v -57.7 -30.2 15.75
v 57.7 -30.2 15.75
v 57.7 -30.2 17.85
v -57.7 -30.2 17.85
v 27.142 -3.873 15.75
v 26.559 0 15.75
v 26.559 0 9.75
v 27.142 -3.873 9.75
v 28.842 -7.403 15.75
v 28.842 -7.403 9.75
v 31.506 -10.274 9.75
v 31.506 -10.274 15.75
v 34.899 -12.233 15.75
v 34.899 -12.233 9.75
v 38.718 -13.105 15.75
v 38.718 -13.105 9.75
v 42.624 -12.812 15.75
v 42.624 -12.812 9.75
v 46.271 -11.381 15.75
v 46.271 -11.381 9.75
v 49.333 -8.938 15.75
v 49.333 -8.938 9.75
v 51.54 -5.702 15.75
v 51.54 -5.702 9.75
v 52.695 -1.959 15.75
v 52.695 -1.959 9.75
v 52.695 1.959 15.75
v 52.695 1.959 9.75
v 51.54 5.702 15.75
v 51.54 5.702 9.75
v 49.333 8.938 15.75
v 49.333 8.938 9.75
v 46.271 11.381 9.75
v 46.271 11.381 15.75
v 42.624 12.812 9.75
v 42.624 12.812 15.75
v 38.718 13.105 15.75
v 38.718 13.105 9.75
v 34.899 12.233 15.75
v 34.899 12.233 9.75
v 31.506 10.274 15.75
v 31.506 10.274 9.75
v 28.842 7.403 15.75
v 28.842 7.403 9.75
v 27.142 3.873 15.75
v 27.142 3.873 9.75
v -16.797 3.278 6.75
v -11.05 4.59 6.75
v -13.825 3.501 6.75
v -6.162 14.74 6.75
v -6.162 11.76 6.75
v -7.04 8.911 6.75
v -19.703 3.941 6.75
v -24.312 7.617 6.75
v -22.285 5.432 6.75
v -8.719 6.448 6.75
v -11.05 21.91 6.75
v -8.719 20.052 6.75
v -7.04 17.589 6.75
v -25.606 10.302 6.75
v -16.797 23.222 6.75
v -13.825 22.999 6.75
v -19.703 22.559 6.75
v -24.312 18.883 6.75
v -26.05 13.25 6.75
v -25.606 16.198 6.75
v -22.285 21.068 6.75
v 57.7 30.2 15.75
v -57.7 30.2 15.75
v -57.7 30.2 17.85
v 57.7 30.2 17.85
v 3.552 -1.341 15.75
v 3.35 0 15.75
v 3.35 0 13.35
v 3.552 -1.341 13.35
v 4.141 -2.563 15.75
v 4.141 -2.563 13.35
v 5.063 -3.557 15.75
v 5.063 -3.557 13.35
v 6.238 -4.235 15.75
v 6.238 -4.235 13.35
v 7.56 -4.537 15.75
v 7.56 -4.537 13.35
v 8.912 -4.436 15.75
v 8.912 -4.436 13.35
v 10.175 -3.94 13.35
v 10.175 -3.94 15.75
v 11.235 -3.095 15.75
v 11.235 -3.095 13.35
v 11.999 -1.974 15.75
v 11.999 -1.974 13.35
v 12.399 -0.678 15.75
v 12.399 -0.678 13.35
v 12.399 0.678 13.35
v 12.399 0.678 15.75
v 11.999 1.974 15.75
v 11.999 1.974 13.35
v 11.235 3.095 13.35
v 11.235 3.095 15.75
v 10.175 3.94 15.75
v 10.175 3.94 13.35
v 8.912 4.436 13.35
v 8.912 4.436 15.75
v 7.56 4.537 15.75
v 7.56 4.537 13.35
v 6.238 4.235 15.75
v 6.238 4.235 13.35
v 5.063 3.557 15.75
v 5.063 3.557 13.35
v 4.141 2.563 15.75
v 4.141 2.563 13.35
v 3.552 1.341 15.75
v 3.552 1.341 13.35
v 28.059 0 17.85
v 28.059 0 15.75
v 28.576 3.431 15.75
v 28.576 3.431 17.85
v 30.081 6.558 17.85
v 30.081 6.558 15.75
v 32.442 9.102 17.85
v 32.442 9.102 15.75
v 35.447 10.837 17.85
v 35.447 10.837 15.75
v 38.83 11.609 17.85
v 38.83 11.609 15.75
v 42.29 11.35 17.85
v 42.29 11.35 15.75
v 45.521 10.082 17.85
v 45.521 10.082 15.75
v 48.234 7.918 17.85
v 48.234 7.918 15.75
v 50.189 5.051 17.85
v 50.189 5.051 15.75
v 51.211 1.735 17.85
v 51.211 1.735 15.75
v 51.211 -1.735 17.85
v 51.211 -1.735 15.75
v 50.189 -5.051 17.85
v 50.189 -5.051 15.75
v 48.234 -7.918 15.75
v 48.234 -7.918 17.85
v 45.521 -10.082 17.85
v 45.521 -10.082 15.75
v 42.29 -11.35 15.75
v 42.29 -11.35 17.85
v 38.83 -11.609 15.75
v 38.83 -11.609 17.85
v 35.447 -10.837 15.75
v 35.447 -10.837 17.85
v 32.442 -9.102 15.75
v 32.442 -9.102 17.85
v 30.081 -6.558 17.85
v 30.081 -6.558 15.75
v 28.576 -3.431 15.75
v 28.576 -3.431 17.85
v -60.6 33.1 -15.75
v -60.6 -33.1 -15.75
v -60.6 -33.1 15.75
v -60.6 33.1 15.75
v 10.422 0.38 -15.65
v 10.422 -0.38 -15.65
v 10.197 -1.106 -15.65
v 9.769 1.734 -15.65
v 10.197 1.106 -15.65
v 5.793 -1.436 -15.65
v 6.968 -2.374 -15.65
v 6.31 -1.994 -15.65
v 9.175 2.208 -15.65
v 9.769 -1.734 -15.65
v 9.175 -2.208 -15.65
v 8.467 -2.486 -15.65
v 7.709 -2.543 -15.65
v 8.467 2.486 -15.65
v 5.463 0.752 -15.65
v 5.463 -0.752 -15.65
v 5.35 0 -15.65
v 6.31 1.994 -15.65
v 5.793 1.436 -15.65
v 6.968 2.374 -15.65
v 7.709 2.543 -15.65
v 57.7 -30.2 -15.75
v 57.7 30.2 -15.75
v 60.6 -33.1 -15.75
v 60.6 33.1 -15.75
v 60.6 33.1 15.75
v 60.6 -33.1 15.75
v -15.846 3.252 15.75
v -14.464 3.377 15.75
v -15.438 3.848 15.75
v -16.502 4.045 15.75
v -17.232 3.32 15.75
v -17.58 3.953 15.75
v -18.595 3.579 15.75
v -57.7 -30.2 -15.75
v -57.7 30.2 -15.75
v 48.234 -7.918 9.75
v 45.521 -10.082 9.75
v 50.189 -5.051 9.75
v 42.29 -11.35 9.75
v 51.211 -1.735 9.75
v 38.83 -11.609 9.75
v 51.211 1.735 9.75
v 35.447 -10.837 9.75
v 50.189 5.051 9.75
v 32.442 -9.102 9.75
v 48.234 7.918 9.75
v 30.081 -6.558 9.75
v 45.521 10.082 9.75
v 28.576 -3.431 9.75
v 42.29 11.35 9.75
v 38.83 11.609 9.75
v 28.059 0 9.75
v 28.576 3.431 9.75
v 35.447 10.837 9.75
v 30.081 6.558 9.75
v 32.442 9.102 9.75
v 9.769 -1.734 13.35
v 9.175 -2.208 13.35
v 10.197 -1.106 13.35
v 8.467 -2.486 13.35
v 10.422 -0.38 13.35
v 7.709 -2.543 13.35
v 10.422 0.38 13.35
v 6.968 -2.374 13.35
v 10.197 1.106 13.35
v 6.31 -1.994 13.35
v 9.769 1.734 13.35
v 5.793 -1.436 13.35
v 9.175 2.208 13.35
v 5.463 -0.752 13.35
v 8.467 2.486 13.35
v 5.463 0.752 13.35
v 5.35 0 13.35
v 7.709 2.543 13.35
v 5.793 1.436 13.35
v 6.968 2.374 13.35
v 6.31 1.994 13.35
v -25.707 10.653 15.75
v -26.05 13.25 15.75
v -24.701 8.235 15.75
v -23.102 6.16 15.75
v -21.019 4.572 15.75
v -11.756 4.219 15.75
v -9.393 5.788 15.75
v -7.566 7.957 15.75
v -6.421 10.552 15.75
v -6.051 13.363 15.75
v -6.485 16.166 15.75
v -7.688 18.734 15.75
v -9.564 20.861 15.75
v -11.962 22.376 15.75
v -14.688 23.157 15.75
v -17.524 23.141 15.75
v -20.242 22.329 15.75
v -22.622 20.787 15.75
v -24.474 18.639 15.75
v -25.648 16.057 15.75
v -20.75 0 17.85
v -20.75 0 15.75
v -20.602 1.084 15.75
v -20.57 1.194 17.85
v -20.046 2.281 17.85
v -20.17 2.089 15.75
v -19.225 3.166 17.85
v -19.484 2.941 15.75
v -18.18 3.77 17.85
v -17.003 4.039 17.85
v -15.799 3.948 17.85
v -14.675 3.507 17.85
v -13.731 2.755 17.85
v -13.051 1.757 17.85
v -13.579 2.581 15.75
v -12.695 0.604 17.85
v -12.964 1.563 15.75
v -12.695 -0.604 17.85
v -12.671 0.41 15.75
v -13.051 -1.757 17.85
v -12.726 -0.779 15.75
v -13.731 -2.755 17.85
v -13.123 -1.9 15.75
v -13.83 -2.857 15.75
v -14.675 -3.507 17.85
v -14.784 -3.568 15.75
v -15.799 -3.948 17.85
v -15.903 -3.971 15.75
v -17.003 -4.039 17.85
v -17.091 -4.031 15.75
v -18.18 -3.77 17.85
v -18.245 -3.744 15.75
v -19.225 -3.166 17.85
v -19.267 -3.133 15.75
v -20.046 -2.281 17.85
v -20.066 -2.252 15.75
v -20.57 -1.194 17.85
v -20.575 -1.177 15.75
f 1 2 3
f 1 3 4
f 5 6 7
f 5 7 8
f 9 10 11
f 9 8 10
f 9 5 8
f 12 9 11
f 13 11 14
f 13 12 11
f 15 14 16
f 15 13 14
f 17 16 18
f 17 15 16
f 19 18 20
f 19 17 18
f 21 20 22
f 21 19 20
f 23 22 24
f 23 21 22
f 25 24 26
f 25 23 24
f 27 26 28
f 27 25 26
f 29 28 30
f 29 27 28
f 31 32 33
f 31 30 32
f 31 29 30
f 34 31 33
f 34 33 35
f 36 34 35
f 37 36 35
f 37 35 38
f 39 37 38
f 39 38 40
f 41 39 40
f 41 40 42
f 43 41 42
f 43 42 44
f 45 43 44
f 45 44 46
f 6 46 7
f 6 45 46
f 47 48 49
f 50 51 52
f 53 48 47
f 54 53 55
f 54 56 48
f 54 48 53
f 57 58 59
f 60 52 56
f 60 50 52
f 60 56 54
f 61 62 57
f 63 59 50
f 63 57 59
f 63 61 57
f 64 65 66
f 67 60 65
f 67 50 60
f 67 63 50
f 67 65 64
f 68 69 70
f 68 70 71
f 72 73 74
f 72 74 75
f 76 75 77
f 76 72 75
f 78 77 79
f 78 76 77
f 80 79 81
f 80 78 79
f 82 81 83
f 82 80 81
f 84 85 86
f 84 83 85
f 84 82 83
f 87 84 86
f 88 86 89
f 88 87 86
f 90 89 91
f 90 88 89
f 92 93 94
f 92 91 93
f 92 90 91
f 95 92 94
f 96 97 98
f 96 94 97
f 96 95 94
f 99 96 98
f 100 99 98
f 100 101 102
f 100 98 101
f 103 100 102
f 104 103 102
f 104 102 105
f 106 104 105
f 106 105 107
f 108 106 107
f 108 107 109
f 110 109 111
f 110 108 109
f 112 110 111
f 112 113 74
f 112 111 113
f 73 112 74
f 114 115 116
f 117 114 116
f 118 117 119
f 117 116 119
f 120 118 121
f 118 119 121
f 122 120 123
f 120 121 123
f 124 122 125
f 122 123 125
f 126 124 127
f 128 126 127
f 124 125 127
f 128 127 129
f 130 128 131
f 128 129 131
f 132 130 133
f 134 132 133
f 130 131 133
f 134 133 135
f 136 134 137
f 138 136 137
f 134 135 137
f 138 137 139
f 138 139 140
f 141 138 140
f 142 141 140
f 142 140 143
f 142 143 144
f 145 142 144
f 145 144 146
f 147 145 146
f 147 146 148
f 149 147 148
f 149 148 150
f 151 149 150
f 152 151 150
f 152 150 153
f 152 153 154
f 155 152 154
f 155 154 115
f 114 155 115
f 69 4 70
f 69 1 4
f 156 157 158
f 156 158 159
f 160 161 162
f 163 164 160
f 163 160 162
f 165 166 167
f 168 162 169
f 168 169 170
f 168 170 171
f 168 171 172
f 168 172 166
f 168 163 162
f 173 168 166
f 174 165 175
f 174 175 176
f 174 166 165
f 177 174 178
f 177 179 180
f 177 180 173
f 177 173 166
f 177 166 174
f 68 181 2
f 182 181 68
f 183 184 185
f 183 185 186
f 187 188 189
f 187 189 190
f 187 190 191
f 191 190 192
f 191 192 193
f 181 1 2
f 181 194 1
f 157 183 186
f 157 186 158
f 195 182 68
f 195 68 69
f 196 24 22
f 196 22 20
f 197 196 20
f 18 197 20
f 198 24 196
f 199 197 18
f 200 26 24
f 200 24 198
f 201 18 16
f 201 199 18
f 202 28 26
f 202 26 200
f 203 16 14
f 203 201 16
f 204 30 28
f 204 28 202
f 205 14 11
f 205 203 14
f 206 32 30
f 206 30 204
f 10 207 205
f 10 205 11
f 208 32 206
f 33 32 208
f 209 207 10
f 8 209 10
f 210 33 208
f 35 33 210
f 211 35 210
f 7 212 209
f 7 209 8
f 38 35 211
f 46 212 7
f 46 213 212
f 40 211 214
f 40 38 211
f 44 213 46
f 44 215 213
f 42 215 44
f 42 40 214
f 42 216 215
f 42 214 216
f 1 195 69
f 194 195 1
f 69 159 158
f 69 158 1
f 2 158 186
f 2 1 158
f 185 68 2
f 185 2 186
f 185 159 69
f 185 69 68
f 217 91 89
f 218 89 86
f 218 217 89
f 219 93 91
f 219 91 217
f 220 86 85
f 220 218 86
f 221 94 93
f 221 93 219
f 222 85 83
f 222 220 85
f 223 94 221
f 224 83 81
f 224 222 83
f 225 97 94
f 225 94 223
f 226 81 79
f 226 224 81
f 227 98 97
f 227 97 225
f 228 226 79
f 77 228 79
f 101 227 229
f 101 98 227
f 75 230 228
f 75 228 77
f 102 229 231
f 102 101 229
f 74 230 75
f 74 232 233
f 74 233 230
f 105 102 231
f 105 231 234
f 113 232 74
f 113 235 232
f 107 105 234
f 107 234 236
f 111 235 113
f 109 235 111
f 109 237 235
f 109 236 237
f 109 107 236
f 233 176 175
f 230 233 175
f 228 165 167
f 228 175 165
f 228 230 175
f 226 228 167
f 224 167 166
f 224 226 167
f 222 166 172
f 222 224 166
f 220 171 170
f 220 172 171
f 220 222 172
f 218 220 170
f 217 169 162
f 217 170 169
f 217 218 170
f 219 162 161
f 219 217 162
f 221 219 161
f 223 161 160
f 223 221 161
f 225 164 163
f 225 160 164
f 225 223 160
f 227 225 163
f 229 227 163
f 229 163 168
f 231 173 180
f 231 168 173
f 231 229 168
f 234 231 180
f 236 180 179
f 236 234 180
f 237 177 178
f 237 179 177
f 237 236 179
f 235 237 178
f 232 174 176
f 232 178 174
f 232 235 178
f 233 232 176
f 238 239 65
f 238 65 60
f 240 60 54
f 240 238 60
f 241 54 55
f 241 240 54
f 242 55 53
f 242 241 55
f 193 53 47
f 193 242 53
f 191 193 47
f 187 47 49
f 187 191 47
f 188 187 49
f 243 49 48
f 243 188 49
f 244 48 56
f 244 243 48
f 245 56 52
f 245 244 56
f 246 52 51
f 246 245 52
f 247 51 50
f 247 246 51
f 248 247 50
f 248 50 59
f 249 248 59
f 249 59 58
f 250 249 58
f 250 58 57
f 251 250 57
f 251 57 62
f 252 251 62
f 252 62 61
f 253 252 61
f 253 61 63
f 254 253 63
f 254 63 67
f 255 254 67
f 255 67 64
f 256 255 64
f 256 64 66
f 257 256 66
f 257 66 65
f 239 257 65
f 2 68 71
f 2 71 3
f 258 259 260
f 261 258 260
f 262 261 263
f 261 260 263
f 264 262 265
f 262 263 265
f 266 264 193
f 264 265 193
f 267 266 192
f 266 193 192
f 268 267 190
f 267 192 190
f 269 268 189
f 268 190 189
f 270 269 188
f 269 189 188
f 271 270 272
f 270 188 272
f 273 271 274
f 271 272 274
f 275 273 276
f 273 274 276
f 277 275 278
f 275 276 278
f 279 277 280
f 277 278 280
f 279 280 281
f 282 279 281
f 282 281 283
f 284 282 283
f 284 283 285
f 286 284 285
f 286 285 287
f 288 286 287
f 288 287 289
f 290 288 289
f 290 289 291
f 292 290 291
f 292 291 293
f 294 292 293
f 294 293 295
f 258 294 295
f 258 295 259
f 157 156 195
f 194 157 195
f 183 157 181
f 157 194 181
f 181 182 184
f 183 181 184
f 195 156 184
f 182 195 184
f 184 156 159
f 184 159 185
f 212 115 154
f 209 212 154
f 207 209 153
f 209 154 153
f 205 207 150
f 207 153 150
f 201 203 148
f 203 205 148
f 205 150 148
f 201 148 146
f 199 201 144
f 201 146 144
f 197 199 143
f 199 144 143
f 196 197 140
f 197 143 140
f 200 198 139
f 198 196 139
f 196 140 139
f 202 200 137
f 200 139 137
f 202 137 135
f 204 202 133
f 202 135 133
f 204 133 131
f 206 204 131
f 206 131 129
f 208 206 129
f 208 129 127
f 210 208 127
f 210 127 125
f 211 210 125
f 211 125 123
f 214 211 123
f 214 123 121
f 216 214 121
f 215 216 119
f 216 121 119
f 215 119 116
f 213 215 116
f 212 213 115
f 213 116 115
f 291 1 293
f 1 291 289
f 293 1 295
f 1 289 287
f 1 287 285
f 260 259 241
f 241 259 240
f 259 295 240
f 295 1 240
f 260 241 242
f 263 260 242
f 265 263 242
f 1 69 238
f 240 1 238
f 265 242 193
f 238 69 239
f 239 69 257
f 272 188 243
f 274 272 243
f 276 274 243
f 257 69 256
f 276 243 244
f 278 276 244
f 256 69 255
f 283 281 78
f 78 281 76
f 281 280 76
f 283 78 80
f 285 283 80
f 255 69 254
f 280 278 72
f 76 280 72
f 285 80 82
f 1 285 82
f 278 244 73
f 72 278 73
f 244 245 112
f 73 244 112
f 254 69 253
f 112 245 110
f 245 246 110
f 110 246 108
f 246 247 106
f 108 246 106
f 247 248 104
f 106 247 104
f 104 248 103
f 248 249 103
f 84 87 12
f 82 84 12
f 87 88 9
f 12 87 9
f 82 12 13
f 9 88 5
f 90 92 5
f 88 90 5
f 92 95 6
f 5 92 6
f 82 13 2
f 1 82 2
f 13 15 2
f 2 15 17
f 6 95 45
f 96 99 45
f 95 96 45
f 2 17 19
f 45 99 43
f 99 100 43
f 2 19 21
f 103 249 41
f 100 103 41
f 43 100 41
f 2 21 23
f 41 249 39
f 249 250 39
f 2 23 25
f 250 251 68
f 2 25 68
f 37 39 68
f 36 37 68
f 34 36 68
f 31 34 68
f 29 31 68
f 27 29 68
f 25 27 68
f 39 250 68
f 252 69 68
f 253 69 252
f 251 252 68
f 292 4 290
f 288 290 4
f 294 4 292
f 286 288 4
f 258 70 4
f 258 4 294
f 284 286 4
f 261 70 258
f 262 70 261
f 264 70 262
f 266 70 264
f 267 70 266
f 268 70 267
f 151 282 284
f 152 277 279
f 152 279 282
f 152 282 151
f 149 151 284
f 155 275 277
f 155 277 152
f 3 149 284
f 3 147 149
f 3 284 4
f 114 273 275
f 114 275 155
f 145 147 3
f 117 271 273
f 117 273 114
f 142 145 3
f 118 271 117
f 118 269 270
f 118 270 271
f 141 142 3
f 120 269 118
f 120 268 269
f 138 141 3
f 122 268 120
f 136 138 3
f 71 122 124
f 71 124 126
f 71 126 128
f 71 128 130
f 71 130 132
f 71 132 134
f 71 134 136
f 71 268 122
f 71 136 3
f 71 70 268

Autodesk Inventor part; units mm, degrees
ref_plane "YZ Plane" through (0, 0, 0) normal (1, 0, 0) x (0, 1, 0)
ref_plane "XZ Plane" through (0, 0, 0) normal (0, 1, 0) x (-1, 0, 0)
ref_plane "XY Plane" through (0, 0, 0) normal (0, 0, 1) x (1, 0, 0)
sketch "Sketch1" plane through (0, 0, 0) normal (0, 0, 1) x (1, 0, 0)
  line L0 (-60.6, 33.1) -> (60.6, 33.1)
  line L1 (60.6, 33.1) -> (60.6, -33.1)
  line L2 (60.6, -33.1) -> (-60.6, -33.1)
  line L3 (-60.6, -33.1) -> (-60.6, 33.1)
  line L4 (57.7, 30.2) -> (-57.7, 30.2)
  line L5 (-57.7, 30.2) -> (-57.7, -30.2)
  line L6 (-57.7, -30.2) -> (57.7, -30.2)
  line L7 (57.7, -30.2) -> (57.7, 30.2)
  point P0 (0, 0)
  dimension "d0" = 121.2
  dimension "d1" = 66.2
  dimension "d2" = 60.6
  dimension "d3" = 33.1
  dimension "d4" = 2.9
extrude "Extrusion1" add sketch "Sketch1" along normal mid plane 31.5
sketch "Sketch2" plane through (0, 0, 15.75) normal (0, 0, 1) x (1, 0, 0)
  line L0 (-57.7, 30.2) -> (57.7, 30.2)
  line L1 (57.7, 30.2) -> (57.7, -30.2)
  line L2 (57.7, -30.2) -> (-57.7, -30.2)
  line L3 (-57.7, -30.2) -> (-57.7, 30.2)
  point P0 (0, 0)
  dimension "d41" = 115.4
  dimension "d42" = 60.4
extrude "Extrusion2" add sketch "Sketch2" along normal blind 2.1
sketch "Sketch3" plane through (0, 0, 15.75) normal (0, 0, -1) x (-1, 0, 0)
  line L0 (57.7, -30.2) -> (57.7, 30.2) projected
  line L1 (57.7, 30.2) -> (-57.7, 30.2) projected
  line L2 (-57.7, 30.2) -> (-57.7, -30.2) projected
  line L3 (-57.7, -30.2) -> (57.7, -30.2) projected
  line L4 (-57.7, -30.2) -> (-57.7, 30.2) projected
  line L5 (57.7, -30.2) -> (57.7, 30.2) projected
  line L6 (57.7, 30.2) -> (-57.7, 30.2) projected
  line L7 (-57.7, 30.2) -> (-57.7, -30.2) projected
  line L8 (-57.7, -30.2) -> (57.7, -30.2) projected
  circle A0 centre (16.7, 0) radius 4.05
  circle A1 centre (-39.7, 0) radius 11.6414
  point P0 (0, 0)
  dimension "d9" = 8.1
  dimension "d10" = 41
  dimension "d11" = 30.2
  dimension "d12" = 30.2
  dimension "d13" = 18
  dimension "d28" = 60.4
  dimension "d43" = 56.4
extrude "Extrusion3" cut sketch "Sketch3" against normal through all contours A0 | A1
sketch "Sketch4" plane through (0, 0, 15.75) normal (0, 0, -1) x (-1, 0, 0)
  circle A0 centre (-39.7, 0) radius 11.6414 projected
  circle A1 centre (-39.7, 0) radius 13.1414
  point P0 (0, 0)
  dimension "d16" = 23.2828
  dimension "d17" = 26.2828
extrude "Extrusion4" add sketch "Sketch4" along normal blind 6
sketch "Sketch5" plane through (0, 0, 15.75) normal (0, 0, -1) x (-1, 0, 0)
  circle A0 centre (-39.7, 0) radius 13.1414 projected
  circle A1 centre (-7.9, 0) radius 4.55
  circle A2 centre (16.7, 0) radius 4.05 projected
  line L0 (57.7, -30.2) -> (57.7, 30.2) projected
  point P0 (0, 0)
  dimension "d20" = 9.1
  dimension "d21" = 31.8
  dimension "d22" = 0
  dimension "d29" = 24.6
  dimension "d30" = 65.6
  dimension "d31" = 8.1
  dimension "d32" = 41
extrude "Extrusion5" add sketch "Sketch5" along normal blind 2.4 contours A1
sketch "Sketch6" plane through (7.9, 0, 13.35) normal (0, 0, -1) x (-1, 0, 0)
  circle A0 centre (0, 0) radius 4.55 projected
  circle A1 centre (0, 0) radius 2.55
  point P0 (7.9, 0)
  dimension "d25" = 5.1
extrude "Extrusion6" add sketch "Sketch6" along normal blind 29 contours A1
sketch "Sketch7" plane through (0, 0, 15.75) normal (0, 0, -1) x (-1, 0, 0)
  circle A0 centre (-7.9, 0) radius 4.55 projected
  circle A1 centre (16.7, 0) radius 4.05 projected
  circle A2 centre (16.05, 13.25) radius 10
  point P0 (0, 0)
  dimension "d33" = 13.25
  dimension "d34" = 20
  dimension "d36" = 23.95
  dimension "d37" = 8.1
extrude "Extrusion7" add sketch "Sketch7" along normal blind 9 contours A2 A1 | A1 A2 picked at (16.671, 3.5384) picked at (16.4323, 16.7993)
equation "\"d2\" = 0.5 * d0"
equation "\"d3\" = 0.5 * d1"
equation "\"d11\" = 0.5 * d28"
equation "\"d12\" = d11"
properties part number "Casing"
